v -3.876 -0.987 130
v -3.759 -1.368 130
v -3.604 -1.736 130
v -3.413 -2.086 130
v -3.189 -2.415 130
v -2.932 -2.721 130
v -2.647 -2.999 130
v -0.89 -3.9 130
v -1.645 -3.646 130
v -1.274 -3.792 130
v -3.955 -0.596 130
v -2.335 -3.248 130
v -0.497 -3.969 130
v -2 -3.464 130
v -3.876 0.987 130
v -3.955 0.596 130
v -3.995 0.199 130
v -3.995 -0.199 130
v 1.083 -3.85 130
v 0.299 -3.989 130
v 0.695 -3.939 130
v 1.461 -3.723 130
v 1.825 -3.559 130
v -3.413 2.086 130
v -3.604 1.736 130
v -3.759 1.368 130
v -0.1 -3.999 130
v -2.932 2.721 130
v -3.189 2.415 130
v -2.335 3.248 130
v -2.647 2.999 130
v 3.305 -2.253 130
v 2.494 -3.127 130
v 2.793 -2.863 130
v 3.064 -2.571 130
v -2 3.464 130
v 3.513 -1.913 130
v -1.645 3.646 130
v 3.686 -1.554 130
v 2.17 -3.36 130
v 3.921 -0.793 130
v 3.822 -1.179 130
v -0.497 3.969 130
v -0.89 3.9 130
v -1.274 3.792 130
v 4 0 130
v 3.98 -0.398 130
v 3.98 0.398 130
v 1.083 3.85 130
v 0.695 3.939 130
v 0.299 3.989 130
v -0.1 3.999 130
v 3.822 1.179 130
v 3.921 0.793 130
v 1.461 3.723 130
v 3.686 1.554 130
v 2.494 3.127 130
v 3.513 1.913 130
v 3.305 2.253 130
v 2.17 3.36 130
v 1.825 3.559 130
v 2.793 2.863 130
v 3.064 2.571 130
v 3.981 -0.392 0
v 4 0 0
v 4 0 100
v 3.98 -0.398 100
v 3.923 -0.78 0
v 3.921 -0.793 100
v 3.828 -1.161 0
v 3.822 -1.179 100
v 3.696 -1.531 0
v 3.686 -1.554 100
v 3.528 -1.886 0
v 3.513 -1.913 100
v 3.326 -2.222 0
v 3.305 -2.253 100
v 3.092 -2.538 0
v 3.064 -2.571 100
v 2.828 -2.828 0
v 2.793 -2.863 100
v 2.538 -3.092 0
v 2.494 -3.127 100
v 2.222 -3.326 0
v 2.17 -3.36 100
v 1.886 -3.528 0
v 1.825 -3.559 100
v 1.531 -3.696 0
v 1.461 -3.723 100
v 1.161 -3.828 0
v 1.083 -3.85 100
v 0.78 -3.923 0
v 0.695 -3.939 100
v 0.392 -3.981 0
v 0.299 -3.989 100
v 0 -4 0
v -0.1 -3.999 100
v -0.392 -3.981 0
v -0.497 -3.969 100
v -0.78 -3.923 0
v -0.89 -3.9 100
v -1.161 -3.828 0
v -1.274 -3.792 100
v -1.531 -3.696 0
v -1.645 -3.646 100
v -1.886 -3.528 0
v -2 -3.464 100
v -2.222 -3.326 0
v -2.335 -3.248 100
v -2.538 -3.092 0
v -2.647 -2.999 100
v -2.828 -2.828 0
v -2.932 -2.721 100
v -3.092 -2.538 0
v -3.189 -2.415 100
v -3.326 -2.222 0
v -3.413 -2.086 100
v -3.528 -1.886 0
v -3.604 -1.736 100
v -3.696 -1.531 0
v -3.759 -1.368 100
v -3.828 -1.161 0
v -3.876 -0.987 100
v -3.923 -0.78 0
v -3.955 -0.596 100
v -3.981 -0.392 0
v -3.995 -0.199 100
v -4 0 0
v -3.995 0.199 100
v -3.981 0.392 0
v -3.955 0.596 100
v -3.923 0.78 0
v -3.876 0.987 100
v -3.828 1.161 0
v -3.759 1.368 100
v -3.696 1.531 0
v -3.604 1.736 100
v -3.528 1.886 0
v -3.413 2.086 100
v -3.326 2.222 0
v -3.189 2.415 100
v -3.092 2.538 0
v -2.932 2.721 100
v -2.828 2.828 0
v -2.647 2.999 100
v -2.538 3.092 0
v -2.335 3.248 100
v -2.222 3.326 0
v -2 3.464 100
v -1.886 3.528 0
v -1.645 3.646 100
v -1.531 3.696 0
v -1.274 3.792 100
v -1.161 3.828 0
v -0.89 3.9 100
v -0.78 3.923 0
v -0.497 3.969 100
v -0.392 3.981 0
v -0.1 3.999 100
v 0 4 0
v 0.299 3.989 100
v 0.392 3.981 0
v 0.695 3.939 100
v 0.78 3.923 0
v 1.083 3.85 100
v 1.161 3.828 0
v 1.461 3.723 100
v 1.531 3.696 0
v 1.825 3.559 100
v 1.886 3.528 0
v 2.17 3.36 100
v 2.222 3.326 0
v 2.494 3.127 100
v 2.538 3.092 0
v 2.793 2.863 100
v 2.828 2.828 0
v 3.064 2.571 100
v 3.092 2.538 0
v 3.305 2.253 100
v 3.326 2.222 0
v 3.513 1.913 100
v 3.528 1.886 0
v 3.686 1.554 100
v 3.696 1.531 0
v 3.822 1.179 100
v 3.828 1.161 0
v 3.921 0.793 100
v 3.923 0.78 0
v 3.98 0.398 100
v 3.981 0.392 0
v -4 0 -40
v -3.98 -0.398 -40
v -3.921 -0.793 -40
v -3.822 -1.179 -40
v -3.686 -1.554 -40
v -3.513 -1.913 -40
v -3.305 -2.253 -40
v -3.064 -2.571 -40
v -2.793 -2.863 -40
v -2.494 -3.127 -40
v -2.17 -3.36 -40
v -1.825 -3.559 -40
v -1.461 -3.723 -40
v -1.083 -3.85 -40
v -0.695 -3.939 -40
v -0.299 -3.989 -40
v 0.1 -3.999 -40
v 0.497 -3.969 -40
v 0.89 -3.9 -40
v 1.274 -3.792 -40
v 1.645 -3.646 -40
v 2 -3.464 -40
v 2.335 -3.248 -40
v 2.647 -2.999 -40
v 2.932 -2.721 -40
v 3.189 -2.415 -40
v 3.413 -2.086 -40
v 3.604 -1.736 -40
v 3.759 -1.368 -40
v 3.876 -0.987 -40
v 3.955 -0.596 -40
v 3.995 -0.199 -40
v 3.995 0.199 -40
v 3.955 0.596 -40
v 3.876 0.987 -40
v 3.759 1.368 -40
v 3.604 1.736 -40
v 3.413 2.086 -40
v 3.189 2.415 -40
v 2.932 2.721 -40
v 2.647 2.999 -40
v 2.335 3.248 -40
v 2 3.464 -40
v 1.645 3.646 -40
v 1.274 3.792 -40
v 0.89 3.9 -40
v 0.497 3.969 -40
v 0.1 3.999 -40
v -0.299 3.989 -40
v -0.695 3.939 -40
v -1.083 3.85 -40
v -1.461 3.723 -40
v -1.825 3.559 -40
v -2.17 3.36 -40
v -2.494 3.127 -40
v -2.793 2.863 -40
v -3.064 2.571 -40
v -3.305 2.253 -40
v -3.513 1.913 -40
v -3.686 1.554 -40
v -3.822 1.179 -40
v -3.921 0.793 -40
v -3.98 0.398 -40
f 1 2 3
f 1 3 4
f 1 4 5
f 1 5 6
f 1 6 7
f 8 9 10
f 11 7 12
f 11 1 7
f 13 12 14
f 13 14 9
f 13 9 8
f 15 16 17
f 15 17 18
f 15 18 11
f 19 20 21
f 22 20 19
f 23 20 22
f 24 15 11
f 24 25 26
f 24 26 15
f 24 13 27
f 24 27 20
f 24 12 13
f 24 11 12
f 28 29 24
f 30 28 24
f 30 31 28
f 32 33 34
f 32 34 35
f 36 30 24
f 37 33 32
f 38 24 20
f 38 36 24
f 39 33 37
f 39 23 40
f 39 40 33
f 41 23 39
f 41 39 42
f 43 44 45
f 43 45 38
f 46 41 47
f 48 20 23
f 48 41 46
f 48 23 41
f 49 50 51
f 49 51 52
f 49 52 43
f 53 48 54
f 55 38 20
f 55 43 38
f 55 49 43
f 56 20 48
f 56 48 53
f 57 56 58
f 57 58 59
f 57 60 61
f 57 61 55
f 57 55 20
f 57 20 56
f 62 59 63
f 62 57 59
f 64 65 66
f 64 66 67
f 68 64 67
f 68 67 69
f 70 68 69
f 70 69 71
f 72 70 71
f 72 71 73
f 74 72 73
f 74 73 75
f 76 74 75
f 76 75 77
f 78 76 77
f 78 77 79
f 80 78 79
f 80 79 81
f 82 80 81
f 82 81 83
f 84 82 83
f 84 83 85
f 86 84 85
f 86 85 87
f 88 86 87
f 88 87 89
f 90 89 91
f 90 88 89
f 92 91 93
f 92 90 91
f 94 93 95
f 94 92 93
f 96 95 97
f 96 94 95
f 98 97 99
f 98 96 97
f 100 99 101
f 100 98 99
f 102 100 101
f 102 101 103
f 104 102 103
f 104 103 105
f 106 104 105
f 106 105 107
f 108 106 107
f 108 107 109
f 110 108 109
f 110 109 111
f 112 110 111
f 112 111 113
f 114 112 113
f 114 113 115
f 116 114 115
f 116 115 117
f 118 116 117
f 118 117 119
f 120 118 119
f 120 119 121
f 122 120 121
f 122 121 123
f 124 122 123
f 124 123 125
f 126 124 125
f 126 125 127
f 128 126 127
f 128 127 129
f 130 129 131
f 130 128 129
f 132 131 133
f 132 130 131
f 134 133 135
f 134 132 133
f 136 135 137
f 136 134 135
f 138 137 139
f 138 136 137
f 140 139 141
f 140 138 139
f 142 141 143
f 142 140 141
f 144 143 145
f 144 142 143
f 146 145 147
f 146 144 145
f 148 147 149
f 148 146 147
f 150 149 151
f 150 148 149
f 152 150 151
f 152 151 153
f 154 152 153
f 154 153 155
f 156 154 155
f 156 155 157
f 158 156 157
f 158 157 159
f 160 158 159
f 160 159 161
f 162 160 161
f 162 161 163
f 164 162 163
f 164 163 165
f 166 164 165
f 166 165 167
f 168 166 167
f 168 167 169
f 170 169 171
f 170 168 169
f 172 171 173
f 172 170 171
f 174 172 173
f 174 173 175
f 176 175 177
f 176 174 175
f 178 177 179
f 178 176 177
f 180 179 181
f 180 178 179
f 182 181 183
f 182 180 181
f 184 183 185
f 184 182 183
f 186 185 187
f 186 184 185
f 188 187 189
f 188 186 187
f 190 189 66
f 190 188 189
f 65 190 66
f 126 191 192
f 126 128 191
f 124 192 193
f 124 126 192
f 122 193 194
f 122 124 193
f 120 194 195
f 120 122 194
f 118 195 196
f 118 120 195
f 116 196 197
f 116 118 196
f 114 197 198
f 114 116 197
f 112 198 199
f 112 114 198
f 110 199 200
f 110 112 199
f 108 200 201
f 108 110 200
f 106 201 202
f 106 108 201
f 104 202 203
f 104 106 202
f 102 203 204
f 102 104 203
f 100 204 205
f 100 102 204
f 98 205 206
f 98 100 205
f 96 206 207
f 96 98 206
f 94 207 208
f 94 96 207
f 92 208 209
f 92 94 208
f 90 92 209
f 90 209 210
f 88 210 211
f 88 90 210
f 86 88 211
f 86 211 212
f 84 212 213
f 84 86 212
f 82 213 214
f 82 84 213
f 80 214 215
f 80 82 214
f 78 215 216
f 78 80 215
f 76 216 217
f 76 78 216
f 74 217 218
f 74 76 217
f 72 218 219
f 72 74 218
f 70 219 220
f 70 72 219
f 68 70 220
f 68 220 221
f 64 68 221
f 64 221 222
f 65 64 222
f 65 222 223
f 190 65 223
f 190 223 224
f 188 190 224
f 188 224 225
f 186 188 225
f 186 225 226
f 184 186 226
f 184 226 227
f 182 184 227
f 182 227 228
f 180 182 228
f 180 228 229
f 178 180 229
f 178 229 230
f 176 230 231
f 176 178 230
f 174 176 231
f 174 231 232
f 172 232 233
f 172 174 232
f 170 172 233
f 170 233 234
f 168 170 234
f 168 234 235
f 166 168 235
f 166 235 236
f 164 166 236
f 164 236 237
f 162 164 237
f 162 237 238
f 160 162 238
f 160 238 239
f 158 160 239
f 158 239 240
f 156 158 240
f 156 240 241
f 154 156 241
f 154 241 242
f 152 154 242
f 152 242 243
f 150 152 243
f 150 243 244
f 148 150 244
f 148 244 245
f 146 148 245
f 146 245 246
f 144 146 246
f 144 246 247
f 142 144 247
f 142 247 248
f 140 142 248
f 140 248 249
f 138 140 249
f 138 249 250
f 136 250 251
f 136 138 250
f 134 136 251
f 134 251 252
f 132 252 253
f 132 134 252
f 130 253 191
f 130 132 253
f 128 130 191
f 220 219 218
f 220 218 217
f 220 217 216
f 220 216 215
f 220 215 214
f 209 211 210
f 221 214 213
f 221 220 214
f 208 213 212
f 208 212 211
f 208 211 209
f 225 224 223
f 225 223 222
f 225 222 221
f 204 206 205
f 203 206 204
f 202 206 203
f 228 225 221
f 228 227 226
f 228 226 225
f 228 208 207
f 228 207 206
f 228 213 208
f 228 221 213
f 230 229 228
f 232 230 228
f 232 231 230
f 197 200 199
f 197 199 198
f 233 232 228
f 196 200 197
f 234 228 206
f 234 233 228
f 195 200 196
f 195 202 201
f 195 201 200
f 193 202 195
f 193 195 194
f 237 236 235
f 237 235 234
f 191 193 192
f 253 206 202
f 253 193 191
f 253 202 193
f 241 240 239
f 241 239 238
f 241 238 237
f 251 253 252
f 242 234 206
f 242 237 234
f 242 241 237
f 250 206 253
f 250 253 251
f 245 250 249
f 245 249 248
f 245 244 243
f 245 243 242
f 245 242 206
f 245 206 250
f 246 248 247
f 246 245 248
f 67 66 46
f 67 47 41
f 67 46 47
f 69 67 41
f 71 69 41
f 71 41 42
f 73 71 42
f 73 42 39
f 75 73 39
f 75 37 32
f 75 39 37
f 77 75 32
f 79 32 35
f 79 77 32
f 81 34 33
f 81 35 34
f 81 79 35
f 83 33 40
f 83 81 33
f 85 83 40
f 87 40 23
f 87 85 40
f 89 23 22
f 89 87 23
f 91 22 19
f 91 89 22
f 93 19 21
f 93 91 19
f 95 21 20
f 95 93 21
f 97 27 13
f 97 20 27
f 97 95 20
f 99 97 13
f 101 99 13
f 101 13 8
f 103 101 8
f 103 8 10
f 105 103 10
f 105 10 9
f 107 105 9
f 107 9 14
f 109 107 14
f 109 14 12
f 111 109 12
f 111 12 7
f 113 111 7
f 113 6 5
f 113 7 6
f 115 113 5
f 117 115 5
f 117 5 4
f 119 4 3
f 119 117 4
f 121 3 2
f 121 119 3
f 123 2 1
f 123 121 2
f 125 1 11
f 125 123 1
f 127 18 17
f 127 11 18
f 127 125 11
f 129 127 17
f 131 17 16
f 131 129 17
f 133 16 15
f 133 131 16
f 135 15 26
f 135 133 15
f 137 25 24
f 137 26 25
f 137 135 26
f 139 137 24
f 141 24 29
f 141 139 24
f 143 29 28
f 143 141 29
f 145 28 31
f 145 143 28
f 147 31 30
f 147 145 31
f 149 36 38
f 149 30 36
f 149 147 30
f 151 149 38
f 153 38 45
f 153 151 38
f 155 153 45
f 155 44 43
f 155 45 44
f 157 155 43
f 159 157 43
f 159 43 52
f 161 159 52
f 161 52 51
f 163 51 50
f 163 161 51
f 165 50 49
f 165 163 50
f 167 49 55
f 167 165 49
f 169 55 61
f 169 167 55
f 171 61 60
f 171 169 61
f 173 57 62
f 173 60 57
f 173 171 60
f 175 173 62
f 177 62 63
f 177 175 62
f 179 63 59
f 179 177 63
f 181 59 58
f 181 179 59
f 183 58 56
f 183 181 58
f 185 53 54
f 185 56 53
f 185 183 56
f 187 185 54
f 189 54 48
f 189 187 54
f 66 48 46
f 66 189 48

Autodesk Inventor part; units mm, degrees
ref_plane "YZ Plane" through (0, 0, 0) normal (1, 0, 0) x (0, 1, 0)
ref_plane "XZ Plane" through (0, 0, 0) normal (0, 1, 0) x (-1, 0, 0)
ref_plane "XY Plane" through (0, 0, 0) normal (0, 0, 1) x (1, 0, 0)
sketch "スケッチ1" plane through (0, 0, 0) normal (0, 0, 1) x (1, 0, 0)
  circle A0 centre (0, 0) radius 4
  dimension "d0" = 8
extrude "押し出し1" add sketch "スケッチ1" along normal blind 100
sketch "スケッチ2" plane through (0, 0, 100) normal (0, 0, 1) x (1, 0, 0)
  circle A0 centre (0, 0) radius 4
sketch "スケッチ3" plane through (0, 0, 0) normal (0, 0, -1) x (-1, 0, 0)
  circle A0 centre (0, 0) radius 4
extrude "押し出し3" add sketch "スケッチ3" along normal blind 40
extrude "押し出し4" add sketch "スケッチ2" along normal blind 30
properties part number "8mm軸_1"
